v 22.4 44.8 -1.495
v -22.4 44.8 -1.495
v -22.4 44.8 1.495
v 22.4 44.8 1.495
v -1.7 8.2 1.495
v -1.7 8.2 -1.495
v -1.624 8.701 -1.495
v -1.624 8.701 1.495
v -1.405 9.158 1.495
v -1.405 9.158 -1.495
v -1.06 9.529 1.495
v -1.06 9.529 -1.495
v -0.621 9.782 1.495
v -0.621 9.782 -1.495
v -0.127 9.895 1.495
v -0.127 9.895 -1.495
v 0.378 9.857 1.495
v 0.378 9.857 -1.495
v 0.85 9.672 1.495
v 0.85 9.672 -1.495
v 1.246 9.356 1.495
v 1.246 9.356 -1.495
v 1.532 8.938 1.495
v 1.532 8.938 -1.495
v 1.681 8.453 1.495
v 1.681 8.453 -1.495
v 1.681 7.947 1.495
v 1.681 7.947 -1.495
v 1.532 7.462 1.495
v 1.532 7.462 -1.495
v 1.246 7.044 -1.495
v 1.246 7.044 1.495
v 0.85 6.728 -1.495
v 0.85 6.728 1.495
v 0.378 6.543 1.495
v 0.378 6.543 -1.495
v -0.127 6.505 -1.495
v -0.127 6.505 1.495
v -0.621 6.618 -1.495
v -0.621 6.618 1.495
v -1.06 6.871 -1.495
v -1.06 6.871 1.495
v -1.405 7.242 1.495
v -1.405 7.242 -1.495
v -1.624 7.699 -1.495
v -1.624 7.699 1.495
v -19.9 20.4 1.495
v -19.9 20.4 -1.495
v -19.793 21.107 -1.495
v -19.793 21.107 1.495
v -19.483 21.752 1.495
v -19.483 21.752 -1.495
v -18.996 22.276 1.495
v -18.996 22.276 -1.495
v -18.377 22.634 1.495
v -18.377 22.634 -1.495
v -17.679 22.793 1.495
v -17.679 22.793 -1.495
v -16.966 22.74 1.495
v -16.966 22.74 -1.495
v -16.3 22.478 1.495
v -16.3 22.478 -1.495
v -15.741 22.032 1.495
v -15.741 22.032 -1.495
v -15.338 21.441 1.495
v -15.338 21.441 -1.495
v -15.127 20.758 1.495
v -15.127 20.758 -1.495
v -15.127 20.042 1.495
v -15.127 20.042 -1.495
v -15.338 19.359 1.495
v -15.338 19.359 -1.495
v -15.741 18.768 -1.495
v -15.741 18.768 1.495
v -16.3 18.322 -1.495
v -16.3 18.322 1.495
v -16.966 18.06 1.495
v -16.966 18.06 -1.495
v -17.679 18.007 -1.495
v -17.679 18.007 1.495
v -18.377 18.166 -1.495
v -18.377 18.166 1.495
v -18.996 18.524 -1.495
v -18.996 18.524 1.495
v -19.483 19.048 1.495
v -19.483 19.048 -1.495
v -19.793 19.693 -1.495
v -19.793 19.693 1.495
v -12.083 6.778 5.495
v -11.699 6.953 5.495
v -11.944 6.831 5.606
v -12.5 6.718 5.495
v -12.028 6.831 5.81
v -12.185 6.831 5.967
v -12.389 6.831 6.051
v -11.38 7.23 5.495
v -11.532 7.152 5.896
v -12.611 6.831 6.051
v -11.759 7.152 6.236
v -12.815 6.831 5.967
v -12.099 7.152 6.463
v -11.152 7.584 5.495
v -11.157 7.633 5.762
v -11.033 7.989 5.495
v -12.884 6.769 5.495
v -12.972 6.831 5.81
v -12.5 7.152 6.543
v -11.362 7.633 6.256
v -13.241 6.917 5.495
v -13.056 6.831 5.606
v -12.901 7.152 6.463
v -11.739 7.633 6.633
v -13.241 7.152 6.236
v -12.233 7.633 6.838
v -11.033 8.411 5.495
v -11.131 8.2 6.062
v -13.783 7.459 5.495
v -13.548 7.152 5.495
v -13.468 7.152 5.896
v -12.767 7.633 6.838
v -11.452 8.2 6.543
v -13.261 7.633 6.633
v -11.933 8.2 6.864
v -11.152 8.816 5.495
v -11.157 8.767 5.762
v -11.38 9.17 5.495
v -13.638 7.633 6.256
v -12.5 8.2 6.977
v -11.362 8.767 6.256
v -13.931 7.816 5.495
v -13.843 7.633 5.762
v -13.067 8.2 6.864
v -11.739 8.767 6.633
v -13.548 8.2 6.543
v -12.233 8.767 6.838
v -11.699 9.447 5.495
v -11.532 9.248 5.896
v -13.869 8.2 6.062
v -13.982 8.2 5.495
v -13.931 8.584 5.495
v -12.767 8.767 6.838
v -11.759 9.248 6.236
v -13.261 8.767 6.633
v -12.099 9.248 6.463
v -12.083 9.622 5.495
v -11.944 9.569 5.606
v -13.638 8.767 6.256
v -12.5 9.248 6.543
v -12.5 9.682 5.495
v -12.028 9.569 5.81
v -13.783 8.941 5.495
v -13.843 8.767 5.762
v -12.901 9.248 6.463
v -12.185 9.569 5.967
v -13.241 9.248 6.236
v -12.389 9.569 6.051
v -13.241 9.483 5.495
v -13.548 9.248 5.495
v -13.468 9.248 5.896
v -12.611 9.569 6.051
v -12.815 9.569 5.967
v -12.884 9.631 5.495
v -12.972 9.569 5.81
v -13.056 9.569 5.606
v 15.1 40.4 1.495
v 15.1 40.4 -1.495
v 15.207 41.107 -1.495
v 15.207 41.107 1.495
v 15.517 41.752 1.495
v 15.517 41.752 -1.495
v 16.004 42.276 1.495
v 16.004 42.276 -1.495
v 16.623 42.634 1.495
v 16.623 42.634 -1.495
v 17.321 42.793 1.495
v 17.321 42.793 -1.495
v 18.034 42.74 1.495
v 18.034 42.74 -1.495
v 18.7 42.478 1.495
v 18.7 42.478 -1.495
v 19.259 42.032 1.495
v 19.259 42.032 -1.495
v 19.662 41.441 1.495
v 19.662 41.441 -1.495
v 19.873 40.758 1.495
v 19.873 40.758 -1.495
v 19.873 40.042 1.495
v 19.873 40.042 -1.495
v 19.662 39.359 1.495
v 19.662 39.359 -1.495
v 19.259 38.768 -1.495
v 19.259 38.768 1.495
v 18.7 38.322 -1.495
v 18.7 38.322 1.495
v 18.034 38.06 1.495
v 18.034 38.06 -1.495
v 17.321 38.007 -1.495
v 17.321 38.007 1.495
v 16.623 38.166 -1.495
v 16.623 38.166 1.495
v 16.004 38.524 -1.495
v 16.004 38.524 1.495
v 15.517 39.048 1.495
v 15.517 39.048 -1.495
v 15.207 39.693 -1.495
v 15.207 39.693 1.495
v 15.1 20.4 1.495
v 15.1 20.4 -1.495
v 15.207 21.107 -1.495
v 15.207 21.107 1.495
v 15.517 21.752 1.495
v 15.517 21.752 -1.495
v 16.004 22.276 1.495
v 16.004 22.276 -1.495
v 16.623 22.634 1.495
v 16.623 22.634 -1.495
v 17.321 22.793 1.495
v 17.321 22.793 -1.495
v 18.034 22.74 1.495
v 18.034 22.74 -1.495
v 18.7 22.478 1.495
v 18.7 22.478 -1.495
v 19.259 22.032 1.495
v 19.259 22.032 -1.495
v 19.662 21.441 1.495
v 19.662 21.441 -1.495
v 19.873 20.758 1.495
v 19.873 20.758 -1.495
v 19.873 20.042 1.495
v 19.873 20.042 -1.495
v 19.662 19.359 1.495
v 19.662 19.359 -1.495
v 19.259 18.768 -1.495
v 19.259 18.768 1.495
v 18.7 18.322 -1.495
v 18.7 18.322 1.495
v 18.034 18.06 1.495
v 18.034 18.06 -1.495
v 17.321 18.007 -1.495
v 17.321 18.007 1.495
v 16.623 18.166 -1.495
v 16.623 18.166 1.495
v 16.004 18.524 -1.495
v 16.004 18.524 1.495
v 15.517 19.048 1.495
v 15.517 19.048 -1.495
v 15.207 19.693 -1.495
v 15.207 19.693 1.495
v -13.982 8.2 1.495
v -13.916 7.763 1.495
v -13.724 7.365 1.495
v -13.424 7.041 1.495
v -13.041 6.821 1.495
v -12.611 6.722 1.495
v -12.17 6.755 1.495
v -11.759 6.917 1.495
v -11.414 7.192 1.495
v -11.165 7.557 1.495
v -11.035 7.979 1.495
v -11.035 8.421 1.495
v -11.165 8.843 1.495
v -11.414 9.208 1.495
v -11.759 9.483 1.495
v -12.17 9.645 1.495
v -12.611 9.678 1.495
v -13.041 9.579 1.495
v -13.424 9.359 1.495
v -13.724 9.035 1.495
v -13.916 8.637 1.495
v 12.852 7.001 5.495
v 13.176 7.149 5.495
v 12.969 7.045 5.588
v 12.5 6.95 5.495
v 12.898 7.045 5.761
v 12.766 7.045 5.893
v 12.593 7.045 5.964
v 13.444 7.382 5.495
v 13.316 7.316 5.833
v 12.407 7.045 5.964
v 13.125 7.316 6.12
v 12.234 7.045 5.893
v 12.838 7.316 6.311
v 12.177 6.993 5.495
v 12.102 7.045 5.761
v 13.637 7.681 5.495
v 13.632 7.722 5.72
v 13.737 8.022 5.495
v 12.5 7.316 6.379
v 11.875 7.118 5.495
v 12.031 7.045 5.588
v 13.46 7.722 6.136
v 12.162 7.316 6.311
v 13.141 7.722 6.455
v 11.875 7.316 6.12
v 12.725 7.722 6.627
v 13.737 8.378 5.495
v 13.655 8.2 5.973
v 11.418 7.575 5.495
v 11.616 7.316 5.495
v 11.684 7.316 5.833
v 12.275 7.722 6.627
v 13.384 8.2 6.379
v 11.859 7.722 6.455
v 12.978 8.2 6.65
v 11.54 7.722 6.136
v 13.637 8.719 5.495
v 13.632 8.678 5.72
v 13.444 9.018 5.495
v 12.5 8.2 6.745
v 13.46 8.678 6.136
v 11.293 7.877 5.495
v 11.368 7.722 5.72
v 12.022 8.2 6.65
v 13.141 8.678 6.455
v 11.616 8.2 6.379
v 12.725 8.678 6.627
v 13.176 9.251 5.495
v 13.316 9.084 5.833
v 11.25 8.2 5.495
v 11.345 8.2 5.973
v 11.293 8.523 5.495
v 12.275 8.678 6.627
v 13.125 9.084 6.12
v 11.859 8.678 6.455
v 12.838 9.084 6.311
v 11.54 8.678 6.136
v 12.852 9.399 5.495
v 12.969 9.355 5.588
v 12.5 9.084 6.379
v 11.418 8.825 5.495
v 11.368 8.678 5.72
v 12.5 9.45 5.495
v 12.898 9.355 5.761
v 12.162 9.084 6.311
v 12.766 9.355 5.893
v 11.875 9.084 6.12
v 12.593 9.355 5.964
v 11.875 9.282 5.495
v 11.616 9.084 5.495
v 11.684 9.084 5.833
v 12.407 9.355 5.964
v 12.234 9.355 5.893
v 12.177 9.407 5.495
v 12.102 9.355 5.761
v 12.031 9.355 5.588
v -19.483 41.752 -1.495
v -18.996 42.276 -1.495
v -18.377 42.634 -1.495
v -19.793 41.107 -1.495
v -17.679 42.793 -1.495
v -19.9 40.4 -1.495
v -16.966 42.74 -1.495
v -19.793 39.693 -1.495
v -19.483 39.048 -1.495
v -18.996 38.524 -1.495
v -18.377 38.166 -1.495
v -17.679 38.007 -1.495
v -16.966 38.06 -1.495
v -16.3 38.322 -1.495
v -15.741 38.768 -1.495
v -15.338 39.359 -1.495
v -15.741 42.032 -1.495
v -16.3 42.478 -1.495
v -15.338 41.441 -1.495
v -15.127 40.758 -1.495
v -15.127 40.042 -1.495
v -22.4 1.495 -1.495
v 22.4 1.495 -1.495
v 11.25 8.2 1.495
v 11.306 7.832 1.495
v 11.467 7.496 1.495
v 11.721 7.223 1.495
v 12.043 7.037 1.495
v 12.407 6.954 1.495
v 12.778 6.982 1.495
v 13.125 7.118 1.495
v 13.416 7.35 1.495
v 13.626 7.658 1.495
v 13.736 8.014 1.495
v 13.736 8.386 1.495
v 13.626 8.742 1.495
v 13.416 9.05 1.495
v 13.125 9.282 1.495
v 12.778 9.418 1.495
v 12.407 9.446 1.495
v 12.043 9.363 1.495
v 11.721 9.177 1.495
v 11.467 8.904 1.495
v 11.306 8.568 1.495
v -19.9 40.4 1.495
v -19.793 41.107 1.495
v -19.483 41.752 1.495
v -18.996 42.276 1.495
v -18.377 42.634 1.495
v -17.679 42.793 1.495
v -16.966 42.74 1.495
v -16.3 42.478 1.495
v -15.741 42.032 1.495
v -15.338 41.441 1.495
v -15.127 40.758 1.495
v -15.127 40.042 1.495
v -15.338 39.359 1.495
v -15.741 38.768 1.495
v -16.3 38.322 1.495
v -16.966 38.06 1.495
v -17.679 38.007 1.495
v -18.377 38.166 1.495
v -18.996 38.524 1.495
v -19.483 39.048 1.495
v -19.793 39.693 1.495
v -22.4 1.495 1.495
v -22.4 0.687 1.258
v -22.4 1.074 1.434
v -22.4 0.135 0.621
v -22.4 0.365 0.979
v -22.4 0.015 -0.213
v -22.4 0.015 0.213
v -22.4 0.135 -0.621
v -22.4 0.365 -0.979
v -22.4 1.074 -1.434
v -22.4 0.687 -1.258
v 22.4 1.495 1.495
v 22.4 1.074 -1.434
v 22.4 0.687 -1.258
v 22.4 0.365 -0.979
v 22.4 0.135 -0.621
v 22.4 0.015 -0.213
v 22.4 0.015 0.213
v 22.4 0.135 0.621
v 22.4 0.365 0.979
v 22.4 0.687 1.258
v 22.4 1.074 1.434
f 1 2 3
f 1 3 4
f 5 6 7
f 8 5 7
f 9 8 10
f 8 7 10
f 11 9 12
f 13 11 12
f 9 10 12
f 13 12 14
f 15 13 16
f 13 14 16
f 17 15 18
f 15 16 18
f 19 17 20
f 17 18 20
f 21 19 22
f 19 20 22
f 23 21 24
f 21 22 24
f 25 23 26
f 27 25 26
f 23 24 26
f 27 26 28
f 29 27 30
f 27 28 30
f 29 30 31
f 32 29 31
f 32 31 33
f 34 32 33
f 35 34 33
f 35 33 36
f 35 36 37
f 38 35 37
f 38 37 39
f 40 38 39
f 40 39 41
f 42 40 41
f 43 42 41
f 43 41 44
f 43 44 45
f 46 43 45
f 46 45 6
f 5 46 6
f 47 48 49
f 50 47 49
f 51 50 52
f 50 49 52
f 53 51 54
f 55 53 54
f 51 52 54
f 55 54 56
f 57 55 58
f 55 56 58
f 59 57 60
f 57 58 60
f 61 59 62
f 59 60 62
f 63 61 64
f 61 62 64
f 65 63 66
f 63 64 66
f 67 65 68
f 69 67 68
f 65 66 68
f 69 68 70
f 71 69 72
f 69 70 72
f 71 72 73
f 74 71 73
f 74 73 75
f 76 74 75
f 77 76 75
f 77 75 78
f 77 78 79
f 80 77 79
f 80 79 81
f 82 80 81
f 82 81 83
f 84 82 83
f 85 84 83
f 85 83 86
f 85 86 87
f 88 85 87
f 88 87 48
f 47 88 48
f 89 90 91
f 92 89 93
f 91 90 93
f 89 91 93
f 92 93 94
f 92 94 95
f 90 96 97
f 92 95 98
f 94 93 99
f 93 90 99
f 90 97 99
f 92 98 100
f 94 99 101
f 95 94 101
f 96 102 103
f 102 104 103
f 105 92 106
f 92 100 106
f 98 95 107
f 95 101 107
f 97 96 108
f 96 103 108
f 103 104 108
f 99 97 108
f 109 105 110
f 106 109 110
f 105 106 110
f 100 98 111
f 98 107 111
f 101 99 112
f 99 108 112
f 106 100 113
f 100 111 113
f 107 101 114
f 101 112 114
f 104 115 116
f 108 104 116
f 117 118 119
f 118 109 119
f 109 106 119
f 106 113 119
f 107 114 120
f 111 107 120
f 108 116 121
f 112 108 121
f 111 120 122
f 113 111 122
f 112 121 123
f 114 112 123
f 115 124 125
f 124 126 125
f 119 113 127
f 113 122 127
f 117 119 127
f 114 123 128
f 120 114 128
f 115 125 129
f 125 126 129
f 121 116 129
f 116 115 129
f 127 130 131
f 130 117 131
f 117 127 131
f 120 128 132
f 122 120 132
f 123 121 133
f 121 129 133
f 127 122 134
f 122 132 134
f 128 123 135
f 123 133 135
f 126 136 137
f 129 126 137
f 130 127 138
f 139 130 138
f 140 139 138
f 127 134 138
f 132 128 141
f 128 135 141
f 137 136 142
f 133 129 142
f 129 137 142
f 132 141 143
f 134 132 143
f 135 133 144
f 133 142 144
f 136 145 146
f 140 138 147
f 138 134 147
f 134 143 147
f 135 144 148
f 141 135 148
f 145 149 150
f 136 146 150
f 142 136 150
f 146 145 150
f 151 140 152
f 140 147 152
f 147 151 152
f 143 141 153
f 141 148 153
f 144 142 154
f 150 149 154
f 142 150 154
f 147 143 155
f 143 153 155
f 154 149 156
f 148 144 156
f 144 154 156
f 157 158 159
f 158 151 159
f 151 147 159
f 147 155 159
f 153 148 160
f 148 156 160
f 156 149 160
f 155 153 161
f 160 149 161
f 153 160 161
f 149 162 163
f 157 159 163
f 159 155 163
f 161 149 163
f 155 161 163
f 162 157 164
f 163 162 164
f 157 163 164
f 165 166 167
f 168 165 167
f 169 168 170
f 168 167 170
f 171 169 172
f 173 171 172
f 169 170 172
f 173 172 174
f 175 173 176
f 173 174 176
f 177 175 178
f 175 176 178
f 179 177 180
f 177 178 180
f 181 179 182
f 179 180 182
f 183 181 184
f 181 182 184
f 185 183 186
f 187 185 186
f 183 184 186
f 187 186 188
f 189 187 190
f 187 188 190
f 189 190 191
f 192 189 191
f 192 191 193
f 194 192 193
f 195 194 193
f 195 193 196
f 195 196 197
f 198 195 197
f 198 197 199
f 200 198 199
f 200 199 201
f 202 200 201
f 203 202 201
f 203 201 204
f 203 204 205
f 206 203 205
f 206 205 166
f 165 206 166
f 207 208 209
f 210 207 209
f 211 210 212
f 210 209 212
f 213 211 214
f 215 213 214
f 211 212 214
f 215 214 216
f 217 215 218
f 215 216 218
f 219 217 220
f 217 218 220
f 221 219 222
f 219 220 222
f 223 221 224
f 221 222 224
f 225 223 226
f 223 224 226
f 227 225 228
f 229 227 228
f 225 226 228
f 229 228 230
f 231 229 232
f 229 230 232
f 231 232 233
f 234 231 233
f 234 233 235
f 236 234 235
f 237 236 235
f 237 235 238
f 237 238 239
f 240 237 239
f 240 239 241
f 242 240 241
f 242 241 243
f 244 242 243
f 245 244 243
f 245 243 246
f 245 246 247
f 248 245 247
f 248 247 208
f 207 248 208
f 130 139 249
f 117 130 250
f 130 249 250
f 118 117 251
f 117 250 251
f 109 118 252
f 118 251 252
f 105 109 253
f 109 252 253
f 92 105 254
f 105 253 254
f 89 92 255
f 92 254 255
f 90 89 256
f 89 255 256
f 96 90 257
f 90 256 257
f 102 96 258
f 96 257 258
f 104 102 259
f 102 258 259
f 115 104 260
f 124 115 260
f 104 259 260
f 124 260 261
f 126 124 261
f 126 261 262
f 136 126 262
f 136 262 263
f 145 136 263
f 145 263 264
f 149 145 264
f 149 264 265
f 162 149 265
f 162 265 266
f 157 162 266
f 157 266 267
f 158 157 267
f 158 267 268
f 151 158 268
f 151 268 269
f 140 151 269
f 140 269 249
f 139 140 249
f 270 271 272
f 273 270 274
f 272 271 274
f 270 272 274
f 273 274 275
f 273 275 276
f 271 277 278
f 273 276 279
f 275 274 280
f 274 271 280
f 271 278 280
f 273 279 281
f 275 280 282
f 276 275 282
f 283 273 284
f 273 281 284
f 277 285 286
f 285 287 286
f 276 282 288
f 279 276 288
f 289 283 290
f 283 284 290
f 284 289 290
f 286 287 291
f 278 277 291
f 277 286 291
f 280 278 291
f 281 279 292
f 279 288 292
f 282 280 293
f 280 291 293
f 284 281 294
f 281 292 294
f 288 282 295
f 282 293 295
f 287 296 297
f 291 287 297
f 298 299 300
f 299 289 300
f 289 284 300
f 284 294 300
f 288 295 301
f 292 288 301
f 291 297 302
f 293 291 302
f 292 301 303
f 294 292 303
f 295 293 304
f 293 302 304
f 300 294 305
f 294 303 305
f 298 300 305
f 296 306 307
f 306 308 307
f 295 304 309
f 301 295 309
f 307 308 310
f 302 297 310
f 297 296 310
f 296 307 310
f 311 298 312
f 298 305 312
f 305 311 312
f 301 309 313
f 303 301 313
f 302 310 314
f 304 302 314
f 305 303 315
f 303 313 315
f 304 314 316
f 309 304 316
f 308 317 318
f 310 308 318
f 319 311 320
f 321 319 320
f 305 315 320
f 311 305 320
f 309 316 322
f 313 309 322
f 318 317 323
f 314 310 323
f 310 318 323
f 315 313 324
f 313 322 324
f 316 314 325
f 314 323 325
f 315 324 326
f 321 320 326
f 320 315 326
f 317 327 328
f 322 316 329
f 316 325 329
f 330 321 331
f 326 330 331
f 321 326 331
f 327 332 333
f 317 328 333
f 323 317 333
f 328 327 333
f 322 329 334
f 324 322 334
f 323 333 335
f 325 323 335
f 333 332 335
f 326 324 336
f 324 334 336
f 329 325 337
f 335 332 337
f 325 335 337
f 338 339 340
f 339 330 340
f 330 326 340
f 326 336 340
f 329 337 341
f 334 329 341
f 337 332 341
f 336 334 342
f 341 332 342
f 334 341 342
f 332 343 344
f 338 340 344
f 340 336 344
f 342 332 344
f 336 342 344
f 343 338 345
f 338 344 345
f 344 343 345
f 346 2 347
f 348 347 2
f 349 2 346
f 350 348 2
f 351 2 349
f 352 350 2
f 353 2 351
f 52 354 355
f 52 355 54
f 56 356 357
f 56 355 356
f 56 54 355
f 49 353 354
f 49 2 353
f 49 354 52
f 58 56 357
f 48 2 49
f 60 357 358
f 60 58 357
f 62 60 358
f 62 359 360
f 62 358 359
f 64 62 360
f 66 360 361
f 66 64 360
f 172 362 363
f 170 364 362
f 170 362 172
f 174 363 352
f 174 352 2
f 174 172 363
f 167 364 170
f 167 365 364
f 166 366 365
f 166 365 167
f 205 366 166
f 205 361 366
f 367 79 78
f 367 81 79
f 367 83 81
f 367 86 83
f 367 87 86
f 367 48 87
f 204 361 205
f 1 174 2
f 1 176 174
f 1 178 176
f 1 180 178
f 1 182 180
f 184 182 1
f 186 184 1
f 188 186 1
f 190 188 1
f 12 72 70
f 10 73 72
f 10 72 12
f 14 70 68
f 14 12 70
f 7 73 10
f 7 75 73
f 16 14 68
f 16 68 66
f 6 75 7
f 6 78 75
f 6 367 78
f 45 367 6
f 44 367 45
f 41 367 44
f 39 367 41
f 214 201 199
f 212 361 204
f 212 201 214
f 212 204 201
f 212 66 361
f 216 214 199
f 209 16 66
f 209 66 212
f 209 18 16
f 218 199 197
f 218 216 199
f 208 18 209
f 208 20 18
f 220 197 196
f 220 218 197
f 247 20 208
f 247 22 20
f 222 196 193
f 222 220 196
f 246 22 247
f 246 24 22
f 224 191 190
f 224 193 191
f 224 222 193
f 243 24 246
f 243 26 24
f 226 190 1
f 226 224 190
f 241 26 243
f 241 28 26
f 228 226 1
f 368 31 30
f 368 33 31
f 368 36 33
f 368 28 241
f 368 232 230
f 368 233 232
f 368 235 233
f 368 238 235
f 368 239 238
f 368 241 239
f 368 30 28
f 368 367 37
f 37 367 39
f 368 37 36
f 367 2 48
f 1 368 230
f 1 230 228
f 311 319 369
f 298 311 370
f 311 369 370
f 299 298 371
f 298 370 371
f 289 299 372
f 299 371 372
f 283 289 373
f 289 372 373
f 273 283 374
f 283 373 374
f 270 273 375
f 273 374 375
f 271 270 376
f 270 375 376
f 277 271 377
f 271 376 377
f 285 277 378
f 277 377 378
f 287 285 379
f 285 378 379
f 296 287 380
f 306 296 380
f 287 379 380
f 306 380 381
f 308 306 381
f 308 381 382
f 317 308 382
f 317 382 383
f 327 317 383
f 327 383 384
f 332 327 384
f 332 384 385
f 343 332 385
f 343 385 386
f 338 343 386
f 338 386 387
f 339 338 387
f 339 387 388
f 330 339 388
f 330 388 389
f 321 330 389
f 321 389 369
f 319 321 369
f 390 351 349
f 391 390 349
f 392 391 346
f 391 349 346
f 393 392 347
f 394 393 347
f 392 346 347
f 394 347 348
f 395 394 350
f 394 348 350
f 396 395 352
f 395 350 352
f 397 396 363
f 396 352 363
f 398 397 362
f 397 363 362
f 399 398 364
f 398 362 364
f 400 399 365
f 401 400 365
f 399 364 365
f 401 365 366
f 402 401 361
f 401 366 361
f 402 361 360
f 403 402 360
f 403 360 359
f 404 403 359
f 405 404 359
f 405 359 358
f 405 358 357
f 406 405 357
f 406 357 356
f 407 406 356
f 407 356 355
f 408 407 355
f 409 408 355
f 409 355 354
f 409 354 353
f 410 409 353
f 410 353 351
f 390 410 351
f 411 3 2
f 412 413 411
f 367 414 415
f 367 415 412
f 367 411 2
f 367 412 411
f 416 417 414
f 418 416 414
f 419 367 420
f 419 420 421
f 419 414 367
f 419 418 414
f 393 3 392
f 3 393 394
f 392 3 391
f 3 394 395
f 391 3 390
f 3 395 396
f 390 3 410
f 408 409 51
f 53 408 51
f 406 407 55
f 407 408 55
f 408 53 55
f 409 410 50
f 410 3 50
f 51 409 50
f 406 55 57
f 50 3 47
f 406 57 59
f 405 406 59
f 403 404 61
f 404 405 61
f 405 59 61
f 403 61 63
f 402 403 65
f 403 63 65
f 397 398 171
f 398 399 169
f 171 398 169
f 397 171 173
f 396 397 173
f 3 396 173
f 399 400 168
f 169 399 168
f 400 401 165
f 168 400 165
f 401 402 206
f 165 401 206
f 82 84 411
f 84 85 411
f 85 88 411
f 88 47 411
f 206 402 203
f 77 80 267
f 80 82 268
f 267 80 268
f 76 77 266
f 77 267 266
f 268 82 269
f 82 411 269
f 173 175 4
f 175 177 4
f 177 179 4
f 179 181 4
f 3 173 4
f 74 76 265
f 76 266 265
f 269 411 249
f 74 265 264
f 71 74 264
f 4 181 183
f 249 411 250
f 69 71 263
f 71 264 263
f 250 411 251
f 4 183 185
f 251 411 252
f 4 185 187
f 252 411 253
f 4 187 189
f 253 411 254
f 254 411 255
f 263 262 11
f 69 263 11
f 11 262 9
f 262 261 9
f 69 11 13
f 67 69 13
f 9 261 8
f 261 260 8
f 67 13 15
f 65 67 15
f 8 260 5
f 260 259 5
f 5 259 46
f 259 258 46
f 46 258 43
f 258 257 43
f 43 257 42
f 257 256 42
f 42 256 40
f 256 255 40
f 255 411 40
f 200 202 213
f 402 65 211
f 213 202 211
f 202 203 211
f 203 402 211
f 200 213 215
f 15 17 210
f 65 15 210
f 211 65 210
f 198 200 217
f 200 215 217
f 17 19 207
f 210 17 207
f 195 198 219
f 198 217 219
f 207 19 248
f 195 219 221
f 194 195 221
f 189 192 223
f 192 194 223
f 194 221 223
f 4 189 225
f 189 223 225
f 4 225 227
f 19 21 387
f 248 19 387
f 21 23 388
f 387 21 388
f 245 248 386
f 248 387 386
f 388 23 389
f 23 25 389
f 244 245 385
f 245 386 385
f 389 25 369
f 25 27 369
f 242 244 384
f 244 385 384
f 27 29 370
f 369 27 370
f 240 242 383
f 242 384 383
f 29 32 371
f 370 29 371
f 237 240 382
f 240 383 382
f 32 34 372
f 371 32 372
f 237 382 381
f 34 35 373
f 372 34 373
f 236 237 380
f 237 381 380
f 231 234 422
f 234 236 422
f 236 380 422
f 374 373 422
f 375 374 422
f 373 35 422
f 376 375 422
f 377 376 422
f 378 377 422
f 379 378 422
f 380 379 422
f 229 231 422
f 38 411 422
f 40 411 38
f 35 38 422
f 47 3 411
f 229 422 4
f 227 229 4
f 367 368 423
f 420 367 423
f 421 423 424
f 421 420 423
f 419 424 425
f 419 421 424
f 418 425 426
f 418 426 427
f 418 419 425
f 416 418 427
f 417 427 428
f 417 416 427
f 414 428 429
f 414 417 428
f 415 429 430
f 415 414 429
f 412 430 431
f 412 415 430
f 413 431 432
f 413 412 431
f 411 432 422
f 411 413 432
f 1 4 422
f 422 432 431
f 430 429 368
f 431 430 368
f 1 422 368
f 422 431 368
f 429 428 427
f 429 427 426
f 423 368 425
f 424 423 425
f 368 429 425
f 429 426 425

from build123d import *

# Parameters (mm, degrees)
SKETCH1_W            = 44.8
SKETCH1_H            = 2.99
BOSS_EXTRUDE1_DEPTH  = 44.8
FILLET1_RADIUS       = 1.495
FILLET1_LENGTH       = 44.8
M4_CLEARANCE_HOLE1_D = 4.8
M3_CLEARANCE_HOLE1_D = 3.4
SKETCH8_R            = 1.481852537
SKETCH8_R_2          = 1.249642824
BOSS_EXTRUDE2_DEPTH  = 4
REVOLVE1_ANGLE       = 180
REVOLVE2_ANGLE       = 180


with BuildPart() as part:
    # Sketch1 → Boss-Extrude1 (new body)
    with BuildSketch(Plane(origin=(0, 0, 0), x_dir=(1, 0, 0), z_dir=(0, 1, 0))):
        Rectangle(SKETCH1_W, SKETCH1_H)
    extrude(amount=BOSS_EXTRUDE1_DEPTH)

    # Fillet1: full round fillet: the end face becomes a half cylinder, R = half its width
    fillet1_face = Plane((0, 0, 0), x_dir=(-1, 0, 0), z_dir=(0, -1, 0))  # on the end face: x along it, z out of the body
    fillet1_slab = fillet1_face.offset(-FILLET1_RADIUS / 2) * Box(FILLET1_LENGTH, 2 * FILLET1_RADIUS, FILLET1_RADIUS, mode=Mode.PRIVATE)  # the body's end, R deep
    fillet1_round = Plane((0, 1.495, 0), x_dir=(0, -1, 0), z_dir=(-1, 0, 0)) * Cylinder(FILLET1_RADIUS, FILLET1_LENGTH, mode=Mode.PRIVATE)  # its axis R under the face
    add(fillet1_slab - fillet1_round, mode=Mode.SUBTRACT)

    # M4 Clearance Hole1 (through all)
    with Locations(Plane.XY.offset(1.495)):
        with Locations((-17.5, 40.4), (-17.5, 20.4), (17.5, 20.4), (17.5, 40.4)):
            Hole(M4_CLEARANCE_HOLE1_D / 2)

    # M3 Clearance Hole1 (through all)
    with Locations(Plane.XY.offset(1.495)):
        with Locations((0, 8.2)):
            Hole(M3_CLEARANCE_HOLE1_D / 2)

    # Sketch8 → Boss-Extrude2 (add)
    with BuildSketch(Plane.XY.offset(1.495)):
        with Locations(Location((-12.5, 8.2, 0), (0, 0, 180))):
            Circle(SKETCH8_R)
        with Locations(Location((12.5, 8.2, 0), (0, 0, 180))):
            Circle(SKETCH8_R_2)
    extrude(amount=BOSS_EXTRUDE2_DEPTH)

    # Sketch9 → Revolve1 (revolve)
    with BuildSketch(Plane.XY.offset(5.495)):
        with BuildLine():
            Line((-12.5, 9.681852537), (-12.5, 6.718147463))
            ThreePointArc((-12.5, 6.718147463), (-11.018147463, 8.2), (-12.5, 9.681852537))
        make_face()
    revolve(axis=Axis((-12.5, 9.681852537, 5.495), (0, -1, 0)), revolution_arc=REVOLVE1_ANGLE)

    # Sketch10 → Revolve2 (revolve)
    with BuildSketch(Plane.XY.offset(5.495)):
        with BuildLine():
            Line((12.5, 9.449642824), (12.5, 6.950357176))
            ThreePointArc((12.5, 6.950357176), (13.749642824, 8.2), (12.5, 9.449642824))
        make_face()
    revolve(axis=Axis((12.5, 9.449642824, 5.495), (0, -1, 0)), revolution_arc=REVOLVE2_ANGLE)


solid = part.part
